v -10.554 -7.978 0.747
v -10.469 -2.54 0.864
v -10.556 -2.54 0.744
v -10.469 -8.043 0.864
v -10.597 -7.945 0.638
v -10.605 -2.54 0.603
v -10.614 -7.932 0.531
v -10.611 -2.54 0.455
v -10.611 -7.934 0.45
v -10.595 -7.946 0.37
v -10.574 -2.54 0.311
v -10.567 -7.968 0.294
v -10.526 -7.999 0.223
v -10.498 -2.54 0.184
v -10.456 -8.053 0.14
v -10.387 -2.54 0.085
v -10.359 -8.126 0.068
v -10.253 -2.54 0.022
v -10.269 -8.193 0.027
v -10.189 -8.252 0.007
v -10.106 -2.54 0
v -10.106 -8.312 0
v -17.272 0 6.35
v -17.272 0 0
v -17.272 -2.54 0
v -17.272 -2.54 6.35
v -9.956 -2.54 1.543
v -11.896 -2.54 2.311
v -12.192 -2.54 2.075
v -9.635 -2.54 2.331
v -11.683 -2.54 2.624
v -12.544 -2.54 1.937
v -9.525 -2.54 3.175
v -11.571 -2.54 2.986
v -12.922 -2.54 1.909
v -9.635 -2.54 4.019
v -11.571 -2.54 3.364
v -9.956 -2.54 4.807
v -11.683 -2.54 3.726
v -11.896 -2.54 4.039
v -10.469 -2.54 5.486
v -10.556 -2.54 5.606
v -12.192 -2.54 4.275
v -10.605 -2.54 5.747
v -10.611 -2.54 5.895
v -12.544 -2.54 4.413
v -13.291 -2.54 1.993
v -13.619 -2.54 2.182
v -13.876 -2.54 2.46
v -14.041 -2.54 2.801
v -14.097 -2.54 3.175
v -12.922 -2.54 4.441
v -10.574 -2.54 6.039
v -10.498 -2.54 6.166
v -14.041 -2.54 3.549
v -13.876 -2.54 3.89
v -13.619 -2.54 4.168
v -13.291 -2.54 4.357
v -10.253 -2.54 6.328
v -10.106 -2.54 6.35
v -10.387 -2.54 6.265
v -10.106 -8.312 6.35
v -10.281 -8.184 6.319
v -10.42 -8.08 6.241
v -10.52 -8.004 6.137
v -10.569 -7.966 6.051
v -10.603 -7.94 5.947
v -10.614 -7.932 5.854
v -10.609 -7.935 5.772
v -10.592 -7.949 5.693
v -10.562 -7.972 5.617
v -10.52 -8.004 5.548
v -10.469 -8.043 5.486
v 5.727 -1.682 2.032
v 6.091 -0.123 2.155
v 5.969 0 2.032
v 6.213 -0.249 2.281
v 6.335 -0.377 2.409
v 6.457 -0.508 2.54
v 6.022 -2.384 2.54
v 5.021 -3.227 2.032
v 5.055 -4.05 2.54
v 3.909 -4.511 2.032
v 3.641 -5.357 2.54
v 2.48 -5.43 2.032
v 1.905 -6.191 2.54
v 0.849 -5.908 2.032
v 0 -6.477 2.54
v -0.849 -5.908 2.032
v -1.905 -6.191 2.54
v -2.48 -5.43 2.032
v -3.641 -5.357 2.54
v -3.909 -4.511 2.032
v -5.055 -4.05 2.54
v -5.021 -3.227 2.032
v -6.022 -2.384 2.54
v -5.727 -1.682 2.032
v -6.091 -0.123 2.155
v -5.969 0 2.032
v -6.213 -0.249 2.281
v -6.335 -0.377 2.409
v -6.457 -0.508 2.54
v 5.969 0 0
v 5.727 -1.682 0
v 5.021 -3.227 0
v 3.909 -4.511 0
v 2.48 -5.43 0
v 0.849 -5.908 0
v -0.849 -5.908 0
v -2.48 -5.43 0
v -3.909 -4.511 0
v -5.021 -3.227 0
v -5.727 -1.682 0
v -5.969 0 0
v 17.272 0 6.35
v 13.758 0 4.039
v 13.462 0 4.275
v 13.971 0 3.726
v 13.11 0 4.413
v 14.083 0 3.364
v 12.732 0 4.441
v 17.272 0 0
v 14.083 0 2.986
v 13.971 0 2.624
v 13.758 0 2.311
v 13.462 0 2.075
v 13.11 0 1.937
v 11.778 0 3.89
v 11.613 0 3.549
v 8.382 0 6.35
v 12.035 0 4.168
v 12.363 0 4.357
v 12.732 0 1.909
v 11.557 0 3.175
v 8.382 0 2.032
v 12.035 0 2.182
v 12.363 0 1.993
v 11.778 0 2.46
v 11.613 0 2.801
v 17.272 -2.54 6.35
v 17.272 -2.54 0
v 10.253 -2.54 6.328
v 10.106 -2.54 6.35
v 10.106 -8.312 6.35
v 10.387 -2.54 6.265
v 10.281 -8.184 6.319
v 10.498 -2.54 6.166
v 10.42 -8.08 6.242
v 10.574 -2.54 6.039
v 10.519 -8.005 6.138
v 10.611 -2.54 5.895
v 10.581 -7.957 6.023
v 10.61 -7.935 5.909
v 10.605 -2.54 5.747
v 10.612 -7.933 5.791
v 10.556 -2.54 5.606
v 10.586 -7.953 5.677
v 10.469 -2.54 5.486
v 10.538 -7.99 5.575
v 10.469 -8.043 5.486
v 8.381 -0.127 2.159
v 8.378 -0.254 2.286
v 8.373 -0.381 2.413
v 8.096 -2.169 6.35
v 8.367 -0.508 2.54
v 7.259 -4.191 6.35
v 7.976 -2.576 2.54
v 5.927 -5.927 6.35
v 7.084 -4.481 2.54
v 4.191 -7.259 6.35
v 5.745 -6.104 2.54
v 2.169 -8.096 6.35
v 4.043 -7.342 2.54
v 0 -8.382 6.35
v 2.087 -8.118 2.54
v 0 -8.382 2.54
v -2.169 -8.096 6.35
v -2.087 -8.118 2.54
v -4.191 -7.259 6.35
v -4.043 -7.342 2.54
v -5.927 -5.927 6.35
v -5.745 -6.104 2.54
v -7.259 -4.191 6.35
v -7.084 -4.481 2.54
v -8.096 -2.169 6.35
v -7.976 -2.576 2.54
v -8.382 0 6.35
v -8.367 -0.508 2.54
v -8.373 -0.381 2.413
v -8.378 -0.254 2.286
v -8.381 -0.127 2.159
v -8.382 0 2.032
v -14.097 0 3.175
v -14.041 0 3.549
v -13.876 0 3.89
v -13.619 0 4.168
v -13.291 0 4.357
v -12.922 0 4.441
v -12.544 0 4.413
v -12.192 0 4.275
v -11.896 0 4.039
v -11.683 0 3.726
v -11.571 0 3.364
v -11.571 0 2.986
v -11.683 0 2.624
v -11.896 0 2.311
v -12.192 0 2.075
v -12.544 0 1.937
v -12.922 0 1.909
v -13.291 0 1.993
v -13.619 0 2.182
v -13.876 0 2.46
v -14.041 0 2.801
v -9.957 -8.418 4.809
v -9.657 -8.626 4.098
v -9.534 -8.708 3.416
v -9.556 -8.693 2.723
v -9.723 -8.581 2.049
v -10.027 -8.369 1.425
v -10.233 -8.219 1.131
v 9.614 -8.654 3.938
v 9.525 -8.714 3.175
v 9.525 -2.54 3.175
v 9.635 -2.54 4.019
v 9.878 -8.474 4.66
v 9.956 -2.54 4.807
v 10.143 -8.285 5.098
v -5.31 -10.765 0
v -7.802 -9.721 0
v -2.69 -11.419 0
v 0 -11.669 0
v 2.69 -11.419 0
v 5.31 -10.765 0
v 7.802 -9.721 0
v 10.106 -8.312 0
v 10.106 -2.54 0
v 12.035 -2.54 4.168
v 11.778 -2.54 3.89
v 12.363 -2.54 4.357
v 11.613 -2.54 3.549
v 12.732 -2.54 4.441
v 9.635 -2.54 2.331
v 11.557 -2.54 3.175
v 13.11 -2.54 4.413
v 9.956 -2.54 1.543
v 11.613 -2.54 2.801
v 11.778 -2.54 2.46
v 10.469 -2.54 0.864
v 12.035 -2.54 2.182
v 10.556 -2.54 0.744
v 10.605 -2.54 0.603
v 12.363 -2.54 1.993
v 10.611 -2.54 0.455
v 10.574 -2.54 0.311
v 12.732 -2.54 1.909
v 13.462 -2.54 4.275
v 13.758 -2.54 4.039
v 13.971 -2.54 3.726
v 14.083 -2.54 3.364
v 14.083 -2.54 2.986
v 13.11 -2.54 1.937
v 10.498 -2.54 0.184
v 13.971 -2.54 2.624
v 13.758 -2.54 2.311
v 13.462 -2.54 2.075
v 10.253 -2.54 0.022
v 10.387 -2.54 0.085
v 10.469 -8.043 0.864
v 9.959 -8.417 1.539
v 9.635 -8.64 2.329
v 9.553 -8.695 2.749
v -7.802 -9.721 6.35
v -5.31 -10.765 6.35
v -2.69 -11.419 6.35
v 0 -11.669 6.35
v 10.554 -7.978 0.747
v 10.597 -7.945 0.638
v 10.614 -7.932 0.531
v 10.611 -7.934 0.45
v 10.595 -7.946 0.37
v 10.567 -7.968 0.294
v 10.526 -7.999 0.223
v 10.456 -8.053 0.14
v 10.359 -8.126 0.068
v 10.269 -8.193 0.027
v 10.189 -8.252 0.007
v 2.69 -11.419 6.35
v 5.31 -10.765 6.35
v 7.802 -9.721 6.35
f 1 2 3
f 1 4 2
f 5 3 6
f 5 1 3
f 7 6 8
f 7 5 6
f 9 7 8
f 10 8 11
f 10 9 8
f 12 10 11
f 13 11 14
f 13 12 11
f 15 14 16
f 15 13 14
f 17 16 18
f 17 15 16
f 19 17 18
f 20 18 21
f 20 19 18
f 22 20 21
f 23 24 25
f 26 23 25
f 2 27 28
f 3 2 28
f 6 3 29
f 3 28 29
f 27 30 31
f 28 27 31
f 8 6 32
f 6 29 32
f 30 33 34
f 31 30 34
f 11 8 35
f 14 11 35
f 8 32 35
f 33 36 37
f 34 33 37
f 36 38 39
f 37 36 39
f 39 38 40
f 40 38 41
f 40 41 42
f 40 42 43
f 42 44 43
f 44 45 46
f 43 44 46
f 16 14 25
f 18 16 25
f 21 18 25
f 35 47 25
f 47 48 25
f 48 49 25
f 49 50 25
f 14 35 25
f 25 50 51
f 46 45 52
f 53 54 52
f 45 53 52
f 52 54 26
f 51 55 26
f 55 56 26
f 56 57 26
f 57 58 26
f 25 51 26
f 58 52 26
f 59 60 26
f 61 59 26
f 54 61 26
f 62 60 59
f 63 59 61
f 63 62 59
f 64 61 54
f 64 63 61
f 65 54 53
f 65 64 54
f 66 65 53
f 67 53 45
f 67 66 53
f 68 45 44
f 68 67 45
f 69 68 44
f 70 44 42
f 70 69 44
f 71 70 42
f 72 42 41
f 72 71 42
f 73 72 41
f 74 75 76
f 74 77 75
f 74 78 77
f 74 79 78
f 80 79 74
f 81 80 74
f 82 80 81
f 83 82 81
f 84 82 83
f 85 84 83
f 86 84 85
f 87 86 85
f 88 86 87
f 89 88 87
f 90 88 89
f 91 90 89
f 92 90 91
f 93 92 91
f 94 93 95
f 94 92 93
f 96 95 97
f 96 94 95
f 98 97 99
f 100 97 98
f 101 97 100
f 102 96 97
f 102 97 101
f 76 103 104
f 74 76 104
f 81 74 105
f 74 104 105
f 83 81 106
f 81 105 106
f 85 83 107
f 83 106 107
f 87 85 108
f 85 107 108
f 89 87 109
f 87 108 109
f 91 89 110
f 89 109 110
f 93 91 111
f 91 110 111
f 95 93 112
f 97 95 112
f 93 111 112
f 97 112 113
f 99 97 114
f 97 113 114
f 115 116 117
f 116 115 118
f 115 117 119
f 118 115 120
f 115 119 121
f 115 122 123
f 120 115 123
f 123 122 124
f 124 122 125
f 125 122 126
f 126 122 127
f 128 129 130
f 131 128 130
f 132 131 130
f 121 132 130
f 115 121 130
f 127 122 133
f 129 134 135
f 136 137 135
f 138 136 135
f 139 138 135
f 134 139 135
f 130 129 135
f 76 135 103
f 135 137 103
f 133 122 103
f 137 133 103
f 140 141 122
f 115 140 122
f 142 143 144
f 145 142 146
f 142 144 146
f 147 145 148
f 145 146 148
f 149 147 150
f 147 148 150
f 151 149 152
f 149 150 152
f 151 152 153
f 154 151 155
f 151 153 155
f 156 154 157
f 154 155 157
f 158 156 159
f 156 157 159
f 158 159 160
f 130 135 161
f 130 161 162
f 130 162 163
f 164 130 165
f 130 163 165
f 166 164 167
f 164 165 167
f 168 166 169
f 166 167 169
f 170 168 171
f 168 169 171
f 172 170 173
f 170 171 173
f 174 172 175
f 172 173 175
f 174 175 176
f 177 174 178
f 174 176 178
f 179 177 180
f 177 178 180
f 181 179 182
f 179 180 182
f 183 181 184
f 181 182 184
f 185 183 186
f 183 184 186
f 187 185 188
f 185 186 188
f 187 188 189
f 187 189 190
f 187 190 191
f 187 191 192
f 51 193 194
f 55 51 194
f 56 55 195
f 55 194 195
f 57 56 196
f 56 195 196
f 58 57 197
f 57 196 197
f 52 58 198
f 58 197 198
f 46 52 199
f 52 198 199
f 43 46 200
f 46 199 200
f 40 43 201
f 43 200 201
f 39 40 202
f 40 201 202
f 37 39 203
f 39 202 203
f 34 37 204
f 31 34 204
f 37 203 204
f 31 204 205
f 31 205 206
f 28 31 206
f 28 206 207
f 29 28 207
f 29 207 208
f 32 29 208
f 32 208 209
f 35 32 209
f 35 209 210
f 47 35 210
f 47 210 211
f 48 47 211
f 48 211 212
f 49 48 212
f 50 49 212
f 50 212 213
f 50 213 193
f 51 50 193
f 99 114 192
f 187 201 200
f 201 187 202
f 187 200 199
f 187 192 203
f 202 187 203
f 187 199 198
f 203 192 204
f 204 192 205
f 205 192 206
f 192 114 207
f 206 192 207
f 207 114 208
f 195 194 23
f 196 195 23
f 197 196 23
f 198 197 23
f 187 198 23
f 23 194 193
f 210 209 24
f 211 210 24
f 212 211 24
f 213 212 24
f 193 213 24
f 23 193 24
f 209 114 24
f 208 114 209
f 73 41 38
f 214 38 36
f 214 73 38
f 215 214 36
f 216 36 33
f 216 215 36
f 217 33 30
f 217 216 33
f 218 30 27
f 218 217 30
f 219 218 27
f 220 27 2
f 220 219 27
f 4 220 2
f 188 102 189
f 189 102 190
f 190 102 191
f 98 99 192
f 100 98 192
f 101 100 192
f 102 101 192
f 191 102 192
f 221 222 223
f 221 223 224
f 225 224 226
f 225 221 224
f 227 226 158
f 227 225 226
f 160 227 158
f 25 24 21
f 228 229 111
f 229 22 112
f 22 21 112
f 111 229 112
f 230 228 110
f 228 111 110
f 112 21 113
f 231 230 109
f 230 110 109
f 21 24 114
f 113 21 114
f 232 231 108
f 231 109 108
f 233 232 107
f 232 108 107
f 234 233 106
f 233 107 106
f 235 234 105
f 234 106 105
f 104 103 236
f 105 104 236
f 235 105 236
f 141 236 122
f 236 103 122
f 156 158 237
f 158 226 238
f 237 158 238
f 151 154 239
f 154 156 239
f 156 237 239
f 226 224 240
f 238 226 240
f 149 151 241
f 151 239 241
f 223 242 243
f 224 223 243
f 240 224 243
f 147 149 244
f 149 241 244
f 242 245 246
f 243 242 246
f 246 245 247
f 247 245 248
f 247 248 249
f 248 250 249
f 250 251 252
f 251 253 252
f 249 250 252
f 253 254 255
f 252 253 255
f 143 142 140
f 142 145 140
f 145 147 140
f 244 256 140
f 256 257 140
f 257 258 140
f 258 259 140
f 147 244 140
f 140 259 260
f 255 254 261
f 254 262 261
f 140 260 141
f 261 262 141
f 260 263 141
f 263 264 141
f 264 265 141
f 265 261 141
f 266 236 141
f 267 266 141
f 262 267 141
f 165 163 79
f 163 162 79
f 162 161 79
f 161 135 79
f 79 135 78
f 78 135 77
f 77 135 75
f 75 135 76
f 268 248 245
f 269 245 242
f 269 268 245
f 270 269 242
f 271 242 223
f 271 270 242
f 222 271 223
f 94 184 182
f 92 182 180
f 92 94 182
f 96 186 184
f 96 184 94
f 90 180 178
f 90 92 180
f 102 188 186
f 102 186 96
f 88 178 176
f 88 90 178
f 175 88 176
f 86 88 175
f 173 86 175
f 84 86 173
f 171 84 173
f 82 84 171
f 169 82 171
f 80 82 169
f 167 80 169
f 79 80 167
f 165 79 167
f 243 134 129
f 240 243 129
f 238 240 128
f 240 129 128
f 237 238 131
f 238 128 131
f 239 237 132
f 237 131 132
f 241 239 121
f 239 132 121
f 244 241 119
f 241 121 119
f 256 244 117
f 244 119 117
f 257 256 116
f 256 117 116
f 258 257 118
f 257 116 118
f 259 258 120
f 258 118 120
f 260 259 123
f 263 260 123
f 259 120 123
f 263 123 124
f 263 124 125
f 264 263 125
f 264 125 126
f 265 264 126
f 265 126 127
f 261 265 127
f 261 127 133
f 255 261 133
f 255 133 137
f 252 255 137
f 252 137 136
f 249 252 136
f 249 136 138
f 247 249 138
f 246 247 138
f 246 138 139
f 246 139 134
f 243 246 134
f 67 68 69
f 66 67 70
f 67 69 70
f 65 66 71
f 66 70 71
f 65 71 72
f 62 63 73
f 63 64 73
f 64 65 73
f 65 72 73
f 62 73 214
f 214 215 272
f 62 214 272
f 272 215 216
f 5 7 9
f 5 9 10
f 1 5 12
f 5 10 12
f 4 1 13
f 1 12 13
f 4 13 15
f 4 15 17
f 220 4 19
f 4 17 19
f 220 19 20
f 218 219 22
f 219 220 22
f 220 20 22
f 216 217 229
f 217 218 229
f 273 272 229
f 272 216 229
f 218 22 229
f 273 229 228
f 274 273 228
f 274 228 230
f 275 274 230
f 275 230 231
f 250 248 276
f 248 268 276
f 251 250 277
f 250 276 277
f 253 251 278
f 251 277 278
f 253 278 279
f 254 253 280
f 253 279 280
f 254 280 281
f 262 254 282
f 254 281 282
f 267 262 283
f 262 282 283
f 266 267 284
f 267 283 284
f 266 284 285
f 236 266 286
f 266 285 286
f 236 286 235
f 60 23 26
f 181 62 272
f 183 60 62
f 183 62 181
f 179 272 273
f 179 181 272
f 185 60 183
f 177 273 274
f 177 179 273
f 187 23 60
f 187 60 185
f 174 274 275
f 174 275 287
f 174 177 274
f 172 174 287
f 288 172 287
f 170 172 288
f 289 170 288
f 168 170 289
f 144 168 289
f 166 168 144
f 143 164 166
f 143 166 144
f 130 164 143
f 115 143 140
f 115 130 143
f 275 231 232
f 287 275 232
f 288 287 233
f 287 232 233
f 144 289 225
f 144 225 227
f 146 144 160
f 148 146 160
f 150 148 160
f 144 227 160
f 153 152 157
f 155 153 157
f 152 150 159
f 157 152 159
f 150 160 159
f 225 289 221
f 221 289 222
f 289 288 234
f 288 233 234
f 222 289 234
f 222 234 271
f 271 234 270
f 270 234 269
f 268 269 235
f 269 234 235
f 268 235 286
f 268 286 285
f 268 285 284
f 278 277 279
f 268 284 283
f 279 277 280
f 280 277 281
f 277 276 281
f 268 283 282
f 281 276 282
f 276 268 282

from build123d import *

# Parameters (mm, degrees)
F1_DEPTH = 6.35
F2_DEPTH = 2.54
F3_R     = 1.27
F4_DEPTH = 25.4
F7_DEPTH = 10.16
F8_R     = 0.508
F9_SIZE  = 0.508


with BuildPart() as f1:
    # F0 (on Top) → F1 (new body)
    with BuildSketch(Plane.XY):
        with BuildLine():
            ThreePointArc((8.382, 0), (0, -8.382), (-8.382, 0))
            Line((-8.382, 0), (-17.272, 0))
            Line((-17.272, 0), (-17.272, -2.54))
            Line((-17.272, -2.54), (-15.24, -2.54))
            ThreePointArc((-15.24, -2.54), (-8.8418597658, -9.1442704985), (0, -11.6689691252))
            ThreePointArc((0, -11.6689691252), (8.8418597658, -9.1442704985), (15.24, -2.54))
            Line((15.24, -2.54), (17.272, -2.54))
            Line((17.272, -2.54), (17.272, 0))
            Line((17.272, 0), (8.382, 0))
        make_face()
    extrude(amount=F1_DEPTH)

    # F0 (on Top) → F2 (join)
    with BuildSketch(Plane.XY):
        with BuildLine():
            ThreePointArc((5.969, 0), (0, -5.969), (-5.969, 0))
            Line((-5.969, 0), (-8.382, 0))
            ThreePointArc((-8.382, 0), (0, -8.382), (8.382, 0))
            Line((8.382, 0), (5.969, 0))
        make_face()
    extrude(amount=F2_DEPTH)

    # F3 (on face) → F4 (cut)
    with BuildSketch(Plane(origin=(0, 0, 0), x_dir=(-1, 0, 0), z_dir=(0, 1, 0))):
        with Locations((-12.827, 3.175)):
            Circle(F3_R)
        with Locations((12.827, 3.175)):
            Circle(F3_R)
    extrude(amount=-F4_DEPTH, mode=Mode.SUBTRACT)

    # F6 (on offset) → F7 (cut)
    with BuildSketch(Plane(origin=(0, -12.7, 0), x_dir=(-1, 0, 0), z_dir=(0, 1, 0))):
        with BuildLine():
            ThreePointArc((12.7267177602, -0.1254768553), (15.1261381042, 0.8049434652), (16.129, 3.175))
            ThreePointArc((16.129, 3.175), (15.1883800681, 5.483048564), (12.9024172176, 6.4761386283))
            ThreePointArc((12.9024172176, 6.4761386283), (9.5261688447, 3.2628503518), (12.7267177602, -0.1254768553))
        make_face()
        with BuildLine():
            ThreePointArc((-12.7793536698, -0.1266562249), (-10.4753482207, 0.8570401408), (-9.525, 3.175))
            ThreePointArc((-9.525, 3.175), (-10.4531379965, 5.4702087461), (-12.7157832758, 6.4751264885))
            ThreePointArc((-12.7157832758, 6.4751264885), (-16.128846925, 3.2067943984), (-12.7793536698, -0.1266562249))
        make_face()
        with BuildLine():
            ThreePointArc((-12.7793536698, -0.1266562249), (-16.128846925, 3.2067943984), (-12.7157832758, 6.4751264885))
            Line((-12.7157832758, 6.4751264885), (-20.0003515929, 7.2803031653))
            Line((-20.0003515929, 7.2803031653), (-20.0003515929, -2.0043456461))
            Line((-20.0003515929, -2.0043456461), (-12.7793536698, -0.1266562249))
        make_face()
        with BuildLine():
            ThreePointArc((12.9024172176, 6.4761386283), (15.1883800681, 5.483048564), (16.129, 3.175))
            ThreePointArc((16.129, 3.175), (15.1261381042, 0.8049434652), (12.7267177602, -0.1254768553))
            Line((12.7267177602, -0.1254768553), (20.6403024495, -1.1550099589))
            Line((20.6403024495, -1.1550099589), (20.6403024495, 7.2800177149))
            Line((20.6403024495, 7.2800177149), (12.9024172176, 6.4761386283))
        make_face()
    extrude(amount=F7_DEPTH, mode=Mode.SUBTRACT)

    # F8
    f8_edges = [f1.edges().sort_by_distance(p)[0] for p in [
        (-11.920039, -4.675696, 6.35),
        (-11.920039, -4.675696, 0),
        (11.920039, -4.675696, 6.35),
        (11.920039, -4.675696, 0),
    ]]
    fillet(f8_edges, radius=F8_R)

    # F9
    f9_edges = [f1.edges().sort_by_distance(p)[0] for p in [
        (0, -5.969, 2.54),
        (7.1755, 0, 2.54),
        (-7.1755, 0, 2.54),
    ]]
    chamfer(f9_edges, length=F9_SIZE)


solid = f1.part
